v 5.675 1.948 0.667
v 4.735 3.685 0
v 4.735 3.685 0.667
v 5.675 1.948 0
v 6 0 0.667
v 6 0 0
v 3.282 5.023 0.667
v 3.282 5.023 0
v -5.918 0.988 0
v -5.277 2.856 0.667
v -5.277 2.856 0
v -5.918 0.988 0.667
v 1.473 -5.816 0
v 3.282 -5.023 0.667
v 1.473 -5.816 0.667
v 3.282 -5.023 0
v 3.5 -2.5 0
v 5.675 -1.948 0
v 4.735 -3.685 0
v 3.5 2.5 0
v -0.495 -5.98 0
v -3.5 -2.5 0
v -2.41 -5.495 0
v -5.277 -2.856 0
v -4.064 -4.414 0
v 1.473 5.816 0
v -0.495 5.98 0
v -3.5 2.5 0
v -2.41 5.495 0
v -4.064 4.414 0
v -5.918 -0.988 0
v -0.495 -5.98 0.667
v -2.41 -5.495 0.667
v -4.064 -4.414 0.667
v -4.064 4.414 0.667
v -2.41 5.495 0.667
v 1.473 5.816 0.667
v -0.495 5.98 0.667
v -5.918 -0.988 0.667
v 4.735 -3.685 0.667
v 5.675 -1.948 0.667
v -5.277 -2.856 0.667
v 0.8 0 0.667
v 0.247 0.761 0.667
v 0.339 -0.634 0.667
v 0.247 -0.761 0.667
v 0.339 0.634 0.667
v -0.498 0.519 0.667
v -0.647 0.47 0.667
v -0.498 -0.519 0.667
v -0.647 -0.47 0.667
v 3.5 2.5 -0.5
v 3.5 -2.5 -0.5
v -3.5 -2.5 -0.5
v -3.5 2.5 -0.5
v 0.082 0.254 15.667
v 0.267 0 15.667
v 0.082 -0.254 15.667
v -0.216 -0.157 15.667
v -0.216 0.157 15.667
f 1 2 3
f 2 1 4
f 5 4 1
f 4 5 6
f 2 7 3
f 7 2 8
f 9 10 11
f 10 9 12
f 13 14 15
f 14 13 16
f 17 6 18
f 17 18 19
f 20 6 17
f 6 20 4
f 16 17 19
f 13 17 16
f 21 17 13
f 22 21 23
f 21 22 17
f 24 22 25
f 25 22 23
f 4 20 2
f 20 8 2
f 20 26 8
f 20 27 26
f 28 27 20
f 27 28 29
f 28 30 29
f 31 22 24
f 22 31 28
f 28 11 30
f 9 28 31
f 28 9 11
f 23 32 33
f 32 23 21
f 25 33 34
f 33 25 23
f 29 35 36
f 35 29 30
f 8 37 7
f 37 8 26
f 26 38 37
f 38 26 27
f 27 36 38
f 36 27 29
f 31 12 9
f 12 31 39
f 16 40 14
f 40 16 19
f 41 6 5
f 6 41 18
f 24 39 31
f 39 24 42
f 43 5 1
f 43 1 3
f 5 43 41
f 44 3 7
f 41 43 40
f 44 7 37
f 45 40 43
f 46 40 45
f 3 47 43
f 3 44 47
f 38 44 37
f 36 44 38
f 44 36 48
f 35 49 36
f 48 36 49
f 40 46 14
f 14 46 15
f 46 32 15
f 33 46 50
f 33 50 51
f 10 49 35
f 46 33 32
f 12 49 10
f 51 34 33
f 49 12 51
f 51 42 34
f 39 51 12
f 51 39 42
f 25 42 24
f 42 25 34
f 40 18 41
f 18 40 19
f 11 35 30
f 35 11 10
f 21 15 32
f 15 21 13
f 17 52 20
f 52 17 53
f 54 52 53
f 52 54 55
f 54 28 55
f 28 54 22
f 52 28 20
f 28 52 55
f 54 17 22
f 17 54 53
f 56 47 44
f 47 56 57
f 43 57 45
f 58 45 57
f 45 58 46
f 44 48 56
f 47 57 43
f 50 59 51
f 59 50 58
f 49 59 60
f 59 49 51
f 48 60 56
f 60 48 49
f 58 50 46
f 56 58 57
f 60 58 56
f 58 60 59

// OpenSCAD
// This is mrbenbritton's cookie cutter script
// http://www.thingiverse.com/thing:28882

inputfile = "caterpillar-contour.dxf";

wallThick = 2;
cutterMinimum = 0.4;
baseHeight = 2;
height = 15;
flangeWidth = 6;

cube([7,5,1], center=true);

minkowski(){
	outline();
	cylinder(r1 = wallThick/3, r2 = cutterMinimum/3, h = height);
};
//%cube([.5, .5, height*3], true);

flange();

module flange(){
	difference(){
	minkowski(){
	baseShape(baseHeight/3);
	cylinder(r = flangeWidth, h = baseHeight/3);
	}
	translate([0,0,-0.01])baseShape(baseHeight*1.1);
	};
}



module outline(){
	difference(){
	minkowski(){
	baseShape(baseHeight/3);
	cylinder(r = cutterMinimum/3, h = baseHeight/3);
	}
	translate([0,0,-0.01])baseShape(baseHeight*1.1);
	};
};

module baseShape(H){
	linear_extrude(file = inputfile, height=H);
}
